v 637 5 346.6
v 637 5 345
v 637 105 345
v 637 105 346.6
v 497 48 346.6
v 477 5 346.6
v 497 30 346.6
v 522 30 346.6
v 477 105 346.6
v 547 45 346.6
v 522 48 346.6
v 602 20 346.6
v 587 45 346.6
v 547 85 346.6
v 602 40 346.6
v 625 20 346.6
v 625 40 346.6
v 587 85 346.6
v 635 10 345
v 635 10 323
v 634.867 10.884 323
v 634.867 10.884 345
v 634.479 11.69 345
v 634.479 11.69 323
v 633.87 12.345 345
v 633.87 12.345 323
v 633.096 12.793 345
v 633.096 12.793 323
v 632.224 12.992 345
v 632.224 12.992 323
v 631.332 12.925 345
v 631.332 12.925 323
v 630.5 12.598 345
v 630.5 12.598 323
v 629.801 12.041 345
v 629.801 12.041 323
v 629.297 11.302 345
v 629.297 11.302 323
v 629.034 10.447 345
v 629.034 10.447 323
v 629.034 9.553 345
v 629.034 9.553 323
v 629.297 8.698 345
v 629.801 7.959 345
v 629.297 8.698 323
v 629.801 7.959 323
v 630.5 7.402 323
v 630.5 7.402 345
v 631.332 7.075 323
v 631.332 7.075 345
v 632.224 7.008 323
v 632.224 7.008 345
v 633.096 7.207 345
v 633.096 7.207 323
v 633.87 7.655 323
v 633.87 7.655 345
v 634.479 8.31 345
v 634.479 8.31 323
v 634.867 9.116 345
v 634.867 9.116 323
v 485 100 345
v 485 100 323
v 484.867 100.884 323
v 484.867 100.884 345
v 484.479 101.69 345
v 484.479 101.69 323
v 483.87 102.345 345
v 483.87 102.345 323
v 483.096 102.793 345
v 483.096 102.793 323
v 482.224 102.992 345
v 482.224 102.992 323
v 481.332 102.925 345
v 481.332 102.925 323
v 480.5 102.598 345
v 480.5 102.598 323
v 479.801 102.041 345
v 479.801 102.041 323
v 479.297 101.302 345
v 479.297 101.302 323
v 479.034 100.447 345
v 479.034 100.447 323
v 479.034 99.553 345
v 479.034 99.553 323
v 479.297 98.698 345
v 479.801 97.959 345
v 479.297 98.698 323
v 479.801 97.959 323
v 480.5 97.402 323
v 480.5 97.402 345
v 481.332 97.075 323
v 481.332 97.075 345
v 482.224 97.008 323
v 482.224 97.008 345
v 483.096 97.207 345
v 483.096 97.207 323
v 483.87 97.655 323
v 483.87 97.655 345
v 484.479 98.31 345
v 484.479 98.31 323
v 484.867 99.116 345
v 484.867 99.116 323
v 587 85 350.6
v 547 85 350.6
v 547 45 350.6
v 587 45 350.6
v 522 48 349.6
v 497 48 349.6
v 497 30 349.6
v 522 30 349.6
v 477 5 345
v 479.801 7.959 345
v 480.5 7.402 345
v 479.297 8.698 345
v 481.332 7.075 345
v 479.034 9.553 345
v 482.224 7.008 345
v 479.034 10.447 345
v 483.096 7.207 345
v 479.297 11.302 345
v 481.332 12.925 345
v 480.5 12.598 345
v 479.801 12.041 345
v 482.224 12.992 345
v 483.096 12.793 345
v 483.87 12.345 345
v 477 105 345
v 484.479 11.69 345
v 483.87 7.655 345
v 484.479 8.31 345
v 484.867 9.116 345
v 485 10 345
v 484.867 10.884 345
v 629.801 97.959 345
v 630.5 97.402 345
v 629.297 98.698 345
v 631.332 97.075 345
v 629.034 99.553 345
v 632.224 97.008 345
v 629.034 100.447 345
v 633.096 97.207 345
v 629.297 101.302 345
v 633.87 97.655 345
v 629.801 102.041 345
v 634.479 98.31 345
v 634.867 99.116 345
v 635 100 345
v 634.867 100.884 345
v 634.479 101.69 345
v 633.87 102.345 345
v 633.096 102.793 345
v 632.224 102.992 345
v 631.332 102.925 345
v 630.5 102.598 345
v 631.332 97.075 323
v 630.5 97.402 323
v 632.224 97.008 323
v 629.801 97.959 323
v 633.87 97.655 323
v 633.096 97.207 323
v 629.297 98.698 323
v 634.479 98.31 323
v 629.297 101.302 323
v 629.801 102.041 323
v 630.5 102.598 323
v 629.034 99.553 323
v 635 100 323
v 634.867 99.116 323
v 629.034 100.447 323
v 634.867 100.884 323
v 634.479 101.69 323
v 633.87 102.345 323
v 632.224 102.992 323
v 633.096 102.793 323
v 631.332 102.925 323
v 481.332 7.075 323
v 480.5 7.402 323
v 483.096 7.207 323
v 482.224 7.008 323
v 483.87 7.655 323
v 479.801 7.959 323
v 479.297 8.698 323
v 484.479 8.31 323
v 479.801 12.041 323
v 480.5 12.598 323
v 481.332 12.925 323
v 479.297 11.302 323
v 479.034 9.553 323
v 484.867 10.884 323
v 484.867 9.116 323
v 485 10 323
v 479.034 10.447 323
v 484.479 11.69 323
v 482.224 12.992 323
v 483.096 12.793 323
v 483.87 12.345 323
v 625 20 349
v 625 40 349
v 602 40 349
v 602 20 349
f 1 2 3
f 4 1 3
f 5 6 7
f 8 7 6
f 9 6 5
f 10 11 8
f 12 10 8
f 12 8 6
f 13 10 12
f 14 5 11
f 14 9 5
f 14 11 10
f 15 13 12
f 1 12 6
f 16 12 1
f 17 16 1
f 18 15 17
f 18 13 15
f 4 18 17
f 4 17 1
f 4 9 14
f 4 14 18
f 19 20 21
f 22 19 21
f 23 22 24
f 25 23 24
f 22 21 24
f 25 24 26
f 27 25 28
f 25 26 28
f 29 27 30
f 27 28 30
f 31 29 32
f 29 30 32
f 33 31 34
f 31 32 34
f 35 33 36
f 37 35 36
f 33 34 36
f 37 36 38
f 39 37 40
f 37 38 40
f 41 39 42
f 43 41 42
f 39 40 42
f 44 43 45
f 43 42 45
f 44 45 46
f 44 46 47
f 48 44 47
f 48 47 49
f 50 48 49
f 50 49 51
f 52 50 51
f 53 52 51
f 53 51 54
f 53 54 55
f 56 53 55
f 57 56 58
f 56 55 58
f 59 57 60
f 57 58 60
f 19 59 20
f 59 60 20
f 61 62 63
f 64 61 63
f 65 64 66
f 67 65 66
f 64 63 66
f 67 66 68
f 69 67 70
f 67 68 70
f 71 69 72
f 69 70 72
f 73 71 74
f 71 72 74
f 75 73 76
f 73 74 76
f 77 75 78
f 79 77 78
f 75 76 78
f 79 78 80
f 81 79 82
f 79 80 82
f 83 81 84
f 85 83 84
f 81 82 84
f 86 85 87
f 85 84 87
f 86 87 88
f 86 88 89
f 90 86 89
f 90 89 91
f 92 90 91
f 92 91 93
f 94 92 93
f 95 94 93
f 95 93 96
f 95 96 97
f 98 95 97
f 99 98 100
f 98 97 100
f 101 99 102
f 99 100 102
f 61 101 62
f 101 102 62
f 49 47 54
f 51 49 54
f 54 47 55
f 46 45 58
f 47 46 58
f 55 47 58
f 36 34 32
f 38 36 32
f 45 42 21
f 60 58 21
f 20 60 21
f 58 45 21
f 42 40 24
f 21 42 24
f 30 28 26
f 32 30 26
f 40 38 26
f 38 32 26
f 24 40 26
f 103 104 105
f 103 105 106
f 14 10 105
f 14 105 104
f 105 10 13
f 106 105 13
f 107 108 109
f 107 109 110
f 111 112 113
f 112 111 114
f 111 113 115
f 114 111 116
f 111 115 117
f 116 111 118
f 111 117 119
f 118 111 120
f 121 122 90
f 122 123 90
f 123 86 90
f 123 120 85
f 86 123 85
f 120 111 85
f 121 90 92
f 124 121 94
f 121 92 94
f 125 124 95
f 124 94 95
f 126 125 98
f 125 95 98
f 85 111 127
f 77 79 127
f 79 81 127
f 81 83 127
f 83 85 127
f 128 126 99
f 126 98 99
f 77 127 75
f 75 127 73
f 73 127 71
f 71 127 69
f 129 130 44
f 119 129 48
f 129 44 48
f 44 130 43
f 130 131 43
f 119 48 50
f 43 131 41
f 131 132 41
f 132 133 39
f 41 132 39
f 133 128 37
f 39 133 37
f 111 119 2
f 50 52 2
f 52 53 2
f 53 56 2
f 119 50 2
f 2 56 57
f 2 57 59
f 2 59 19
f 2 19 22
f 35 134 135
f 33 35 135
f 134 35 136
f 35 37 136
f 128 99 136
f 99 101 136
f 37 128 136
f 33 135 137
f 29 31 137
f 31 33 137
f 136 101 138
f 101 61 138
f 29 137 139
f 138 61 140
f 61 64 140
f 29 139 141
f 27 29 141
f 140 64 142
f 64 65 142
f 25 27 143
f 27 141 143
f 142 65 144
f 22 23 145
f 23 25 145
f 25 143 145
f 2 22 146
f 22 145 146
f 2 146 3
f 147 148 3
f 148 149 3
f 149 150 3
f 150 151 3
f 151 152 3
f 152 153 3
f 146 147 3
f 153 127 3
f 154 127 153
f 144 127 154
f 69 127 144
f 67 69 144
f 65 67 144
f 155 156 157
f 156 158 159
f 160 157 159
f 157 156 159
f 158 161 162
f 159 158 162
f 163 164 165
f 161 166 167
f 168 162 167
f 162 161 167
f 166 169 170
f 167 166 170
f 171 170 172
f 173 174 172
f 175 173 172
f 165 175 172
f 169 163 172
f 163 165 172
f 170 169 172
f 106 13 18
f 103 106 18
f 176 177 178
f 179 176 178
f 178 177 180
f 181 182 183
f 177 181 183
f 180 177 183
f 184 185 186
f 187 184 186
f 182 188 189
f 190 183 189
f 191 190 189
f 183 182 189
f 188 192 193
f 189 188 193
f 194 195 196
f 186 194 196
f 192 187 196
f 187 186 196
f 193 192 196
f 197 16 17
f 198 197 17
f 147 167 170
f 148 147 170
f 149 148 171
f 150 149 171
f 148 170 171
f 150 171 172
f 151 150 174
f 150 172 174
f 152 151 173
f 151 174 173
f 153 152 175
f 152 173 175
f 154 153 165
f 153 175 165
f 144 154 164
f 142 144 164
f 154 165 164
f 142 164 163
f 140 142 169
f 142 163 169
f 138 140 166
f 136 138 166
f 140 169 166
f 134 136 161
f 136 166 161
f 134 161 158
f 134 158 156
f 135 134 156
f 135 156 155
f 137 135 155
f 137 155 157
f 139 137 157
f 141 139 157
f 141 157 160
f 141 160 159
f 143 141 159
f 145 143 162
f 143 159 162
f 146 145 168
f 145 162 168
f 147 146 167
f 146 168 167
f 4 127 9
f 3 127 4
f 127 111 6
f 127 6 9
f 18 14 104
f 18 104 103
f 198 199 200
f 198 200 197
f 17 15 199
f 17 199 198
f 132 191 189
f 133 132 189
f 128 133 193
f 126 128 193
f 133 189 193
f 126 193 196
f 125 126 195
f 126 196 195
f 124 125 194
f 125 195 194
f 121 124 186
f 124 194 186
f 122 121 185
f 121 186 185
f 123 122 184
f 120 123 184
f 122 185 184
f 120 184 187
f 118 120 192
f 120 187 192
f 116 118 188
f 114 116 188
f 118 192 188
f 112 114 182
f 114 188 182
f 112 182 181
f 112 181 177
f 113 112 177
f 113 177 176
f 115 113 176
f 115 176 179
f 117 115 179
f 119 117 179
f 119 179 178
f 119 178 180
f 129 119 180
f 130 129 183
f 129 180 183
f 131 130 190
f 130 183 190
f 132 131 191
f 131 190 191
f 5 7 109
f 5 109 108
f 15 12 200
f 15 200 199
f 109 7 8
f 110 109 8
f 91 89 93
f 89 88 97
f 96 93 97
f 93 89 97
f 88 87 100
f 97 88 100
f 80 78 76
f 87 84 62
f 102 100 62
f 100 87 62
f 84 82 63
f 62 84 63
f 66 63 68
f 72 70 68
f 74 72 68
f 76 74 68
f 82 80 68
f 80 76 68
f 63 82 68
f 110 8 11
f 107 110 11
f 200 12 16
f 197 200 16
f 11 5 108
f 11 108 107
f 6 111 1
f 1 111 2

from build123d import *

# Parameters (mm, degrees)
EXTRUDE_START      = 345
EXTRUDE_SKETCH_1_W = 160
EXTRUDE_SKETCH_1_H = 100
EXTRUDE_1_DEPTH    = 1.6
EXTRUDE_START_2    = 346.6
EXTRUDE_SKETCH_2_W = 25
EXTRUDE_SKETCH_2_H = 18
EXTRUDE_2_DEPTH    = 3
EXTRUDE_SKETCH_3_W = 40
EXTRUDE_SKETCH_3_H = 40
EXTRUDE_3_DEPTH    = 4
EXTRUDE_SKETCH_4_W = 23
EXTRUDE_SKETCH_4_H = 20
EXTRUDE_4_DEPTH    = 2.4
EXTRUDE_START_3    = 323
EXTRUDE_SKETCH_5_R = 3
EXTRUDE_5_DEPTH    = 22
EXTRUDE_SKETCH_6_R = 3
EXTRUDE_6_DEPTH    = 22
EXTRUDE_SKETCH_7_R = 3
EXTRUDE_7_DEPTH    = 22
EXTRUDE_SKETCH_8_R = 3
EXTRUDE_8_DEPTH    = 22


with BuildPart() as part:
    # Extrude sketch 1 → Extrude 1 (new body)
    with BuildSketch(Plane.XY.offset(EXTRUDE_START)):
        with Locations((557, 55)):
            Rectangle(EXTRUDE_SKETCH_1_W, EXTRUDE_SKETCH_1_H)
    extrude(amount=EXTRUDE_1_DEPTH)


with BuildPart() as body_2:
    # Extrude sketch 2 → Extrude 2 (new body)
    with BuildSketch(Plane.XY.offset(EXTRUDE_START_2)):
        with Locations((509.5, 39)):
            Rectangle(EXTRUDE_SKETCH_2_W, EXTRUDE_SKETCH_2_H)
    extrude(amount=EXTRUDE_2_DEPTH)


with BuildPart() as body_3:
    # Extrude sketch 3 → Extrude 3 (new body)
    with BuildSketch(Plane.XY.offset(EXTRUDE_START_2)):
        with Locations((567, 65)):
            Rectangle(EXTRUDE_SKETCH_3_W, EXTRUDE_SKETCH_3_H)
    extrude(amount=EXTRUDE_3_DEPTH)


with BuildPart() as body_4:
    # Extrude sketch 4 → Extrude 4 (new body)
    with BuildSketch(Plane.XY.offset(EXTRUDE_START_2)):
        with Locations((613.5, 30)):
            Rectangle(EXTRUDE_SKETCH_4_W, EXTRUDE_SKETCH_4_H)
    extrude(amount=EXTRUDE_4_DEPTH)


with BuildPart() as body_5:
    # Extrude sketch 5 → Extrude 5 (new body)
    with BuildSketch(Plane.XY.offset(EXTRUDE_START_3)):
        with Locations((482, 10)):
            Circle(EXTRUDE_SKETCH_5_R)
    extrude(amount=EXTRUDE_5_DEPTH)


with BuildPart() as body_6:
    # Extrude sketch 6 → Extrude 6 (new body)
    with BuildSketch(Plane.XY.offset(EXTRUDE_START_3)):
        with Locations((482, 100)):
            Circle(EXTRUDE_SKETCH_6_R)
    extrude(amount=EXTRUDE_6_DEPTH)


with BuildPart() as body_7:
    # Extrude sketch 7 → Extrude 7 (new body)
    with BuildSketch(Plane.XY.offset(EXTRUDE_START_3)):
        with Locations((632, 10)):
            Circle(EXTRUDE_SKETCH_7_R)
    extrude(amount=EXTRUDE_7_DEPTH)


with BuildPart() as body_8:
    # Extrude sketch 8 → Extrude 8 (new body)
    with BuildSketch(Plane.XY.offset(EXTRUDE_START_3)):
        with Locations((632, 100)):
            Circle(EXTRUDE_SKETCH_8_R)
    extrude(amount=EXTRUDE_8_DEPTH)


with BuildPart() as body_5_1:
    add(body_5.part)

    # Combine (weld / assembly of features): union body 3, body 6, part, body 7, body 2, body 8, body 4
    add(body_3.part)
    add(body_6.part)
    add(part.part)
    add(body_7.part)
    add(body_2.part)
    add(body_8.part)
    add(body_4.part)


solid = body_5_1.part
